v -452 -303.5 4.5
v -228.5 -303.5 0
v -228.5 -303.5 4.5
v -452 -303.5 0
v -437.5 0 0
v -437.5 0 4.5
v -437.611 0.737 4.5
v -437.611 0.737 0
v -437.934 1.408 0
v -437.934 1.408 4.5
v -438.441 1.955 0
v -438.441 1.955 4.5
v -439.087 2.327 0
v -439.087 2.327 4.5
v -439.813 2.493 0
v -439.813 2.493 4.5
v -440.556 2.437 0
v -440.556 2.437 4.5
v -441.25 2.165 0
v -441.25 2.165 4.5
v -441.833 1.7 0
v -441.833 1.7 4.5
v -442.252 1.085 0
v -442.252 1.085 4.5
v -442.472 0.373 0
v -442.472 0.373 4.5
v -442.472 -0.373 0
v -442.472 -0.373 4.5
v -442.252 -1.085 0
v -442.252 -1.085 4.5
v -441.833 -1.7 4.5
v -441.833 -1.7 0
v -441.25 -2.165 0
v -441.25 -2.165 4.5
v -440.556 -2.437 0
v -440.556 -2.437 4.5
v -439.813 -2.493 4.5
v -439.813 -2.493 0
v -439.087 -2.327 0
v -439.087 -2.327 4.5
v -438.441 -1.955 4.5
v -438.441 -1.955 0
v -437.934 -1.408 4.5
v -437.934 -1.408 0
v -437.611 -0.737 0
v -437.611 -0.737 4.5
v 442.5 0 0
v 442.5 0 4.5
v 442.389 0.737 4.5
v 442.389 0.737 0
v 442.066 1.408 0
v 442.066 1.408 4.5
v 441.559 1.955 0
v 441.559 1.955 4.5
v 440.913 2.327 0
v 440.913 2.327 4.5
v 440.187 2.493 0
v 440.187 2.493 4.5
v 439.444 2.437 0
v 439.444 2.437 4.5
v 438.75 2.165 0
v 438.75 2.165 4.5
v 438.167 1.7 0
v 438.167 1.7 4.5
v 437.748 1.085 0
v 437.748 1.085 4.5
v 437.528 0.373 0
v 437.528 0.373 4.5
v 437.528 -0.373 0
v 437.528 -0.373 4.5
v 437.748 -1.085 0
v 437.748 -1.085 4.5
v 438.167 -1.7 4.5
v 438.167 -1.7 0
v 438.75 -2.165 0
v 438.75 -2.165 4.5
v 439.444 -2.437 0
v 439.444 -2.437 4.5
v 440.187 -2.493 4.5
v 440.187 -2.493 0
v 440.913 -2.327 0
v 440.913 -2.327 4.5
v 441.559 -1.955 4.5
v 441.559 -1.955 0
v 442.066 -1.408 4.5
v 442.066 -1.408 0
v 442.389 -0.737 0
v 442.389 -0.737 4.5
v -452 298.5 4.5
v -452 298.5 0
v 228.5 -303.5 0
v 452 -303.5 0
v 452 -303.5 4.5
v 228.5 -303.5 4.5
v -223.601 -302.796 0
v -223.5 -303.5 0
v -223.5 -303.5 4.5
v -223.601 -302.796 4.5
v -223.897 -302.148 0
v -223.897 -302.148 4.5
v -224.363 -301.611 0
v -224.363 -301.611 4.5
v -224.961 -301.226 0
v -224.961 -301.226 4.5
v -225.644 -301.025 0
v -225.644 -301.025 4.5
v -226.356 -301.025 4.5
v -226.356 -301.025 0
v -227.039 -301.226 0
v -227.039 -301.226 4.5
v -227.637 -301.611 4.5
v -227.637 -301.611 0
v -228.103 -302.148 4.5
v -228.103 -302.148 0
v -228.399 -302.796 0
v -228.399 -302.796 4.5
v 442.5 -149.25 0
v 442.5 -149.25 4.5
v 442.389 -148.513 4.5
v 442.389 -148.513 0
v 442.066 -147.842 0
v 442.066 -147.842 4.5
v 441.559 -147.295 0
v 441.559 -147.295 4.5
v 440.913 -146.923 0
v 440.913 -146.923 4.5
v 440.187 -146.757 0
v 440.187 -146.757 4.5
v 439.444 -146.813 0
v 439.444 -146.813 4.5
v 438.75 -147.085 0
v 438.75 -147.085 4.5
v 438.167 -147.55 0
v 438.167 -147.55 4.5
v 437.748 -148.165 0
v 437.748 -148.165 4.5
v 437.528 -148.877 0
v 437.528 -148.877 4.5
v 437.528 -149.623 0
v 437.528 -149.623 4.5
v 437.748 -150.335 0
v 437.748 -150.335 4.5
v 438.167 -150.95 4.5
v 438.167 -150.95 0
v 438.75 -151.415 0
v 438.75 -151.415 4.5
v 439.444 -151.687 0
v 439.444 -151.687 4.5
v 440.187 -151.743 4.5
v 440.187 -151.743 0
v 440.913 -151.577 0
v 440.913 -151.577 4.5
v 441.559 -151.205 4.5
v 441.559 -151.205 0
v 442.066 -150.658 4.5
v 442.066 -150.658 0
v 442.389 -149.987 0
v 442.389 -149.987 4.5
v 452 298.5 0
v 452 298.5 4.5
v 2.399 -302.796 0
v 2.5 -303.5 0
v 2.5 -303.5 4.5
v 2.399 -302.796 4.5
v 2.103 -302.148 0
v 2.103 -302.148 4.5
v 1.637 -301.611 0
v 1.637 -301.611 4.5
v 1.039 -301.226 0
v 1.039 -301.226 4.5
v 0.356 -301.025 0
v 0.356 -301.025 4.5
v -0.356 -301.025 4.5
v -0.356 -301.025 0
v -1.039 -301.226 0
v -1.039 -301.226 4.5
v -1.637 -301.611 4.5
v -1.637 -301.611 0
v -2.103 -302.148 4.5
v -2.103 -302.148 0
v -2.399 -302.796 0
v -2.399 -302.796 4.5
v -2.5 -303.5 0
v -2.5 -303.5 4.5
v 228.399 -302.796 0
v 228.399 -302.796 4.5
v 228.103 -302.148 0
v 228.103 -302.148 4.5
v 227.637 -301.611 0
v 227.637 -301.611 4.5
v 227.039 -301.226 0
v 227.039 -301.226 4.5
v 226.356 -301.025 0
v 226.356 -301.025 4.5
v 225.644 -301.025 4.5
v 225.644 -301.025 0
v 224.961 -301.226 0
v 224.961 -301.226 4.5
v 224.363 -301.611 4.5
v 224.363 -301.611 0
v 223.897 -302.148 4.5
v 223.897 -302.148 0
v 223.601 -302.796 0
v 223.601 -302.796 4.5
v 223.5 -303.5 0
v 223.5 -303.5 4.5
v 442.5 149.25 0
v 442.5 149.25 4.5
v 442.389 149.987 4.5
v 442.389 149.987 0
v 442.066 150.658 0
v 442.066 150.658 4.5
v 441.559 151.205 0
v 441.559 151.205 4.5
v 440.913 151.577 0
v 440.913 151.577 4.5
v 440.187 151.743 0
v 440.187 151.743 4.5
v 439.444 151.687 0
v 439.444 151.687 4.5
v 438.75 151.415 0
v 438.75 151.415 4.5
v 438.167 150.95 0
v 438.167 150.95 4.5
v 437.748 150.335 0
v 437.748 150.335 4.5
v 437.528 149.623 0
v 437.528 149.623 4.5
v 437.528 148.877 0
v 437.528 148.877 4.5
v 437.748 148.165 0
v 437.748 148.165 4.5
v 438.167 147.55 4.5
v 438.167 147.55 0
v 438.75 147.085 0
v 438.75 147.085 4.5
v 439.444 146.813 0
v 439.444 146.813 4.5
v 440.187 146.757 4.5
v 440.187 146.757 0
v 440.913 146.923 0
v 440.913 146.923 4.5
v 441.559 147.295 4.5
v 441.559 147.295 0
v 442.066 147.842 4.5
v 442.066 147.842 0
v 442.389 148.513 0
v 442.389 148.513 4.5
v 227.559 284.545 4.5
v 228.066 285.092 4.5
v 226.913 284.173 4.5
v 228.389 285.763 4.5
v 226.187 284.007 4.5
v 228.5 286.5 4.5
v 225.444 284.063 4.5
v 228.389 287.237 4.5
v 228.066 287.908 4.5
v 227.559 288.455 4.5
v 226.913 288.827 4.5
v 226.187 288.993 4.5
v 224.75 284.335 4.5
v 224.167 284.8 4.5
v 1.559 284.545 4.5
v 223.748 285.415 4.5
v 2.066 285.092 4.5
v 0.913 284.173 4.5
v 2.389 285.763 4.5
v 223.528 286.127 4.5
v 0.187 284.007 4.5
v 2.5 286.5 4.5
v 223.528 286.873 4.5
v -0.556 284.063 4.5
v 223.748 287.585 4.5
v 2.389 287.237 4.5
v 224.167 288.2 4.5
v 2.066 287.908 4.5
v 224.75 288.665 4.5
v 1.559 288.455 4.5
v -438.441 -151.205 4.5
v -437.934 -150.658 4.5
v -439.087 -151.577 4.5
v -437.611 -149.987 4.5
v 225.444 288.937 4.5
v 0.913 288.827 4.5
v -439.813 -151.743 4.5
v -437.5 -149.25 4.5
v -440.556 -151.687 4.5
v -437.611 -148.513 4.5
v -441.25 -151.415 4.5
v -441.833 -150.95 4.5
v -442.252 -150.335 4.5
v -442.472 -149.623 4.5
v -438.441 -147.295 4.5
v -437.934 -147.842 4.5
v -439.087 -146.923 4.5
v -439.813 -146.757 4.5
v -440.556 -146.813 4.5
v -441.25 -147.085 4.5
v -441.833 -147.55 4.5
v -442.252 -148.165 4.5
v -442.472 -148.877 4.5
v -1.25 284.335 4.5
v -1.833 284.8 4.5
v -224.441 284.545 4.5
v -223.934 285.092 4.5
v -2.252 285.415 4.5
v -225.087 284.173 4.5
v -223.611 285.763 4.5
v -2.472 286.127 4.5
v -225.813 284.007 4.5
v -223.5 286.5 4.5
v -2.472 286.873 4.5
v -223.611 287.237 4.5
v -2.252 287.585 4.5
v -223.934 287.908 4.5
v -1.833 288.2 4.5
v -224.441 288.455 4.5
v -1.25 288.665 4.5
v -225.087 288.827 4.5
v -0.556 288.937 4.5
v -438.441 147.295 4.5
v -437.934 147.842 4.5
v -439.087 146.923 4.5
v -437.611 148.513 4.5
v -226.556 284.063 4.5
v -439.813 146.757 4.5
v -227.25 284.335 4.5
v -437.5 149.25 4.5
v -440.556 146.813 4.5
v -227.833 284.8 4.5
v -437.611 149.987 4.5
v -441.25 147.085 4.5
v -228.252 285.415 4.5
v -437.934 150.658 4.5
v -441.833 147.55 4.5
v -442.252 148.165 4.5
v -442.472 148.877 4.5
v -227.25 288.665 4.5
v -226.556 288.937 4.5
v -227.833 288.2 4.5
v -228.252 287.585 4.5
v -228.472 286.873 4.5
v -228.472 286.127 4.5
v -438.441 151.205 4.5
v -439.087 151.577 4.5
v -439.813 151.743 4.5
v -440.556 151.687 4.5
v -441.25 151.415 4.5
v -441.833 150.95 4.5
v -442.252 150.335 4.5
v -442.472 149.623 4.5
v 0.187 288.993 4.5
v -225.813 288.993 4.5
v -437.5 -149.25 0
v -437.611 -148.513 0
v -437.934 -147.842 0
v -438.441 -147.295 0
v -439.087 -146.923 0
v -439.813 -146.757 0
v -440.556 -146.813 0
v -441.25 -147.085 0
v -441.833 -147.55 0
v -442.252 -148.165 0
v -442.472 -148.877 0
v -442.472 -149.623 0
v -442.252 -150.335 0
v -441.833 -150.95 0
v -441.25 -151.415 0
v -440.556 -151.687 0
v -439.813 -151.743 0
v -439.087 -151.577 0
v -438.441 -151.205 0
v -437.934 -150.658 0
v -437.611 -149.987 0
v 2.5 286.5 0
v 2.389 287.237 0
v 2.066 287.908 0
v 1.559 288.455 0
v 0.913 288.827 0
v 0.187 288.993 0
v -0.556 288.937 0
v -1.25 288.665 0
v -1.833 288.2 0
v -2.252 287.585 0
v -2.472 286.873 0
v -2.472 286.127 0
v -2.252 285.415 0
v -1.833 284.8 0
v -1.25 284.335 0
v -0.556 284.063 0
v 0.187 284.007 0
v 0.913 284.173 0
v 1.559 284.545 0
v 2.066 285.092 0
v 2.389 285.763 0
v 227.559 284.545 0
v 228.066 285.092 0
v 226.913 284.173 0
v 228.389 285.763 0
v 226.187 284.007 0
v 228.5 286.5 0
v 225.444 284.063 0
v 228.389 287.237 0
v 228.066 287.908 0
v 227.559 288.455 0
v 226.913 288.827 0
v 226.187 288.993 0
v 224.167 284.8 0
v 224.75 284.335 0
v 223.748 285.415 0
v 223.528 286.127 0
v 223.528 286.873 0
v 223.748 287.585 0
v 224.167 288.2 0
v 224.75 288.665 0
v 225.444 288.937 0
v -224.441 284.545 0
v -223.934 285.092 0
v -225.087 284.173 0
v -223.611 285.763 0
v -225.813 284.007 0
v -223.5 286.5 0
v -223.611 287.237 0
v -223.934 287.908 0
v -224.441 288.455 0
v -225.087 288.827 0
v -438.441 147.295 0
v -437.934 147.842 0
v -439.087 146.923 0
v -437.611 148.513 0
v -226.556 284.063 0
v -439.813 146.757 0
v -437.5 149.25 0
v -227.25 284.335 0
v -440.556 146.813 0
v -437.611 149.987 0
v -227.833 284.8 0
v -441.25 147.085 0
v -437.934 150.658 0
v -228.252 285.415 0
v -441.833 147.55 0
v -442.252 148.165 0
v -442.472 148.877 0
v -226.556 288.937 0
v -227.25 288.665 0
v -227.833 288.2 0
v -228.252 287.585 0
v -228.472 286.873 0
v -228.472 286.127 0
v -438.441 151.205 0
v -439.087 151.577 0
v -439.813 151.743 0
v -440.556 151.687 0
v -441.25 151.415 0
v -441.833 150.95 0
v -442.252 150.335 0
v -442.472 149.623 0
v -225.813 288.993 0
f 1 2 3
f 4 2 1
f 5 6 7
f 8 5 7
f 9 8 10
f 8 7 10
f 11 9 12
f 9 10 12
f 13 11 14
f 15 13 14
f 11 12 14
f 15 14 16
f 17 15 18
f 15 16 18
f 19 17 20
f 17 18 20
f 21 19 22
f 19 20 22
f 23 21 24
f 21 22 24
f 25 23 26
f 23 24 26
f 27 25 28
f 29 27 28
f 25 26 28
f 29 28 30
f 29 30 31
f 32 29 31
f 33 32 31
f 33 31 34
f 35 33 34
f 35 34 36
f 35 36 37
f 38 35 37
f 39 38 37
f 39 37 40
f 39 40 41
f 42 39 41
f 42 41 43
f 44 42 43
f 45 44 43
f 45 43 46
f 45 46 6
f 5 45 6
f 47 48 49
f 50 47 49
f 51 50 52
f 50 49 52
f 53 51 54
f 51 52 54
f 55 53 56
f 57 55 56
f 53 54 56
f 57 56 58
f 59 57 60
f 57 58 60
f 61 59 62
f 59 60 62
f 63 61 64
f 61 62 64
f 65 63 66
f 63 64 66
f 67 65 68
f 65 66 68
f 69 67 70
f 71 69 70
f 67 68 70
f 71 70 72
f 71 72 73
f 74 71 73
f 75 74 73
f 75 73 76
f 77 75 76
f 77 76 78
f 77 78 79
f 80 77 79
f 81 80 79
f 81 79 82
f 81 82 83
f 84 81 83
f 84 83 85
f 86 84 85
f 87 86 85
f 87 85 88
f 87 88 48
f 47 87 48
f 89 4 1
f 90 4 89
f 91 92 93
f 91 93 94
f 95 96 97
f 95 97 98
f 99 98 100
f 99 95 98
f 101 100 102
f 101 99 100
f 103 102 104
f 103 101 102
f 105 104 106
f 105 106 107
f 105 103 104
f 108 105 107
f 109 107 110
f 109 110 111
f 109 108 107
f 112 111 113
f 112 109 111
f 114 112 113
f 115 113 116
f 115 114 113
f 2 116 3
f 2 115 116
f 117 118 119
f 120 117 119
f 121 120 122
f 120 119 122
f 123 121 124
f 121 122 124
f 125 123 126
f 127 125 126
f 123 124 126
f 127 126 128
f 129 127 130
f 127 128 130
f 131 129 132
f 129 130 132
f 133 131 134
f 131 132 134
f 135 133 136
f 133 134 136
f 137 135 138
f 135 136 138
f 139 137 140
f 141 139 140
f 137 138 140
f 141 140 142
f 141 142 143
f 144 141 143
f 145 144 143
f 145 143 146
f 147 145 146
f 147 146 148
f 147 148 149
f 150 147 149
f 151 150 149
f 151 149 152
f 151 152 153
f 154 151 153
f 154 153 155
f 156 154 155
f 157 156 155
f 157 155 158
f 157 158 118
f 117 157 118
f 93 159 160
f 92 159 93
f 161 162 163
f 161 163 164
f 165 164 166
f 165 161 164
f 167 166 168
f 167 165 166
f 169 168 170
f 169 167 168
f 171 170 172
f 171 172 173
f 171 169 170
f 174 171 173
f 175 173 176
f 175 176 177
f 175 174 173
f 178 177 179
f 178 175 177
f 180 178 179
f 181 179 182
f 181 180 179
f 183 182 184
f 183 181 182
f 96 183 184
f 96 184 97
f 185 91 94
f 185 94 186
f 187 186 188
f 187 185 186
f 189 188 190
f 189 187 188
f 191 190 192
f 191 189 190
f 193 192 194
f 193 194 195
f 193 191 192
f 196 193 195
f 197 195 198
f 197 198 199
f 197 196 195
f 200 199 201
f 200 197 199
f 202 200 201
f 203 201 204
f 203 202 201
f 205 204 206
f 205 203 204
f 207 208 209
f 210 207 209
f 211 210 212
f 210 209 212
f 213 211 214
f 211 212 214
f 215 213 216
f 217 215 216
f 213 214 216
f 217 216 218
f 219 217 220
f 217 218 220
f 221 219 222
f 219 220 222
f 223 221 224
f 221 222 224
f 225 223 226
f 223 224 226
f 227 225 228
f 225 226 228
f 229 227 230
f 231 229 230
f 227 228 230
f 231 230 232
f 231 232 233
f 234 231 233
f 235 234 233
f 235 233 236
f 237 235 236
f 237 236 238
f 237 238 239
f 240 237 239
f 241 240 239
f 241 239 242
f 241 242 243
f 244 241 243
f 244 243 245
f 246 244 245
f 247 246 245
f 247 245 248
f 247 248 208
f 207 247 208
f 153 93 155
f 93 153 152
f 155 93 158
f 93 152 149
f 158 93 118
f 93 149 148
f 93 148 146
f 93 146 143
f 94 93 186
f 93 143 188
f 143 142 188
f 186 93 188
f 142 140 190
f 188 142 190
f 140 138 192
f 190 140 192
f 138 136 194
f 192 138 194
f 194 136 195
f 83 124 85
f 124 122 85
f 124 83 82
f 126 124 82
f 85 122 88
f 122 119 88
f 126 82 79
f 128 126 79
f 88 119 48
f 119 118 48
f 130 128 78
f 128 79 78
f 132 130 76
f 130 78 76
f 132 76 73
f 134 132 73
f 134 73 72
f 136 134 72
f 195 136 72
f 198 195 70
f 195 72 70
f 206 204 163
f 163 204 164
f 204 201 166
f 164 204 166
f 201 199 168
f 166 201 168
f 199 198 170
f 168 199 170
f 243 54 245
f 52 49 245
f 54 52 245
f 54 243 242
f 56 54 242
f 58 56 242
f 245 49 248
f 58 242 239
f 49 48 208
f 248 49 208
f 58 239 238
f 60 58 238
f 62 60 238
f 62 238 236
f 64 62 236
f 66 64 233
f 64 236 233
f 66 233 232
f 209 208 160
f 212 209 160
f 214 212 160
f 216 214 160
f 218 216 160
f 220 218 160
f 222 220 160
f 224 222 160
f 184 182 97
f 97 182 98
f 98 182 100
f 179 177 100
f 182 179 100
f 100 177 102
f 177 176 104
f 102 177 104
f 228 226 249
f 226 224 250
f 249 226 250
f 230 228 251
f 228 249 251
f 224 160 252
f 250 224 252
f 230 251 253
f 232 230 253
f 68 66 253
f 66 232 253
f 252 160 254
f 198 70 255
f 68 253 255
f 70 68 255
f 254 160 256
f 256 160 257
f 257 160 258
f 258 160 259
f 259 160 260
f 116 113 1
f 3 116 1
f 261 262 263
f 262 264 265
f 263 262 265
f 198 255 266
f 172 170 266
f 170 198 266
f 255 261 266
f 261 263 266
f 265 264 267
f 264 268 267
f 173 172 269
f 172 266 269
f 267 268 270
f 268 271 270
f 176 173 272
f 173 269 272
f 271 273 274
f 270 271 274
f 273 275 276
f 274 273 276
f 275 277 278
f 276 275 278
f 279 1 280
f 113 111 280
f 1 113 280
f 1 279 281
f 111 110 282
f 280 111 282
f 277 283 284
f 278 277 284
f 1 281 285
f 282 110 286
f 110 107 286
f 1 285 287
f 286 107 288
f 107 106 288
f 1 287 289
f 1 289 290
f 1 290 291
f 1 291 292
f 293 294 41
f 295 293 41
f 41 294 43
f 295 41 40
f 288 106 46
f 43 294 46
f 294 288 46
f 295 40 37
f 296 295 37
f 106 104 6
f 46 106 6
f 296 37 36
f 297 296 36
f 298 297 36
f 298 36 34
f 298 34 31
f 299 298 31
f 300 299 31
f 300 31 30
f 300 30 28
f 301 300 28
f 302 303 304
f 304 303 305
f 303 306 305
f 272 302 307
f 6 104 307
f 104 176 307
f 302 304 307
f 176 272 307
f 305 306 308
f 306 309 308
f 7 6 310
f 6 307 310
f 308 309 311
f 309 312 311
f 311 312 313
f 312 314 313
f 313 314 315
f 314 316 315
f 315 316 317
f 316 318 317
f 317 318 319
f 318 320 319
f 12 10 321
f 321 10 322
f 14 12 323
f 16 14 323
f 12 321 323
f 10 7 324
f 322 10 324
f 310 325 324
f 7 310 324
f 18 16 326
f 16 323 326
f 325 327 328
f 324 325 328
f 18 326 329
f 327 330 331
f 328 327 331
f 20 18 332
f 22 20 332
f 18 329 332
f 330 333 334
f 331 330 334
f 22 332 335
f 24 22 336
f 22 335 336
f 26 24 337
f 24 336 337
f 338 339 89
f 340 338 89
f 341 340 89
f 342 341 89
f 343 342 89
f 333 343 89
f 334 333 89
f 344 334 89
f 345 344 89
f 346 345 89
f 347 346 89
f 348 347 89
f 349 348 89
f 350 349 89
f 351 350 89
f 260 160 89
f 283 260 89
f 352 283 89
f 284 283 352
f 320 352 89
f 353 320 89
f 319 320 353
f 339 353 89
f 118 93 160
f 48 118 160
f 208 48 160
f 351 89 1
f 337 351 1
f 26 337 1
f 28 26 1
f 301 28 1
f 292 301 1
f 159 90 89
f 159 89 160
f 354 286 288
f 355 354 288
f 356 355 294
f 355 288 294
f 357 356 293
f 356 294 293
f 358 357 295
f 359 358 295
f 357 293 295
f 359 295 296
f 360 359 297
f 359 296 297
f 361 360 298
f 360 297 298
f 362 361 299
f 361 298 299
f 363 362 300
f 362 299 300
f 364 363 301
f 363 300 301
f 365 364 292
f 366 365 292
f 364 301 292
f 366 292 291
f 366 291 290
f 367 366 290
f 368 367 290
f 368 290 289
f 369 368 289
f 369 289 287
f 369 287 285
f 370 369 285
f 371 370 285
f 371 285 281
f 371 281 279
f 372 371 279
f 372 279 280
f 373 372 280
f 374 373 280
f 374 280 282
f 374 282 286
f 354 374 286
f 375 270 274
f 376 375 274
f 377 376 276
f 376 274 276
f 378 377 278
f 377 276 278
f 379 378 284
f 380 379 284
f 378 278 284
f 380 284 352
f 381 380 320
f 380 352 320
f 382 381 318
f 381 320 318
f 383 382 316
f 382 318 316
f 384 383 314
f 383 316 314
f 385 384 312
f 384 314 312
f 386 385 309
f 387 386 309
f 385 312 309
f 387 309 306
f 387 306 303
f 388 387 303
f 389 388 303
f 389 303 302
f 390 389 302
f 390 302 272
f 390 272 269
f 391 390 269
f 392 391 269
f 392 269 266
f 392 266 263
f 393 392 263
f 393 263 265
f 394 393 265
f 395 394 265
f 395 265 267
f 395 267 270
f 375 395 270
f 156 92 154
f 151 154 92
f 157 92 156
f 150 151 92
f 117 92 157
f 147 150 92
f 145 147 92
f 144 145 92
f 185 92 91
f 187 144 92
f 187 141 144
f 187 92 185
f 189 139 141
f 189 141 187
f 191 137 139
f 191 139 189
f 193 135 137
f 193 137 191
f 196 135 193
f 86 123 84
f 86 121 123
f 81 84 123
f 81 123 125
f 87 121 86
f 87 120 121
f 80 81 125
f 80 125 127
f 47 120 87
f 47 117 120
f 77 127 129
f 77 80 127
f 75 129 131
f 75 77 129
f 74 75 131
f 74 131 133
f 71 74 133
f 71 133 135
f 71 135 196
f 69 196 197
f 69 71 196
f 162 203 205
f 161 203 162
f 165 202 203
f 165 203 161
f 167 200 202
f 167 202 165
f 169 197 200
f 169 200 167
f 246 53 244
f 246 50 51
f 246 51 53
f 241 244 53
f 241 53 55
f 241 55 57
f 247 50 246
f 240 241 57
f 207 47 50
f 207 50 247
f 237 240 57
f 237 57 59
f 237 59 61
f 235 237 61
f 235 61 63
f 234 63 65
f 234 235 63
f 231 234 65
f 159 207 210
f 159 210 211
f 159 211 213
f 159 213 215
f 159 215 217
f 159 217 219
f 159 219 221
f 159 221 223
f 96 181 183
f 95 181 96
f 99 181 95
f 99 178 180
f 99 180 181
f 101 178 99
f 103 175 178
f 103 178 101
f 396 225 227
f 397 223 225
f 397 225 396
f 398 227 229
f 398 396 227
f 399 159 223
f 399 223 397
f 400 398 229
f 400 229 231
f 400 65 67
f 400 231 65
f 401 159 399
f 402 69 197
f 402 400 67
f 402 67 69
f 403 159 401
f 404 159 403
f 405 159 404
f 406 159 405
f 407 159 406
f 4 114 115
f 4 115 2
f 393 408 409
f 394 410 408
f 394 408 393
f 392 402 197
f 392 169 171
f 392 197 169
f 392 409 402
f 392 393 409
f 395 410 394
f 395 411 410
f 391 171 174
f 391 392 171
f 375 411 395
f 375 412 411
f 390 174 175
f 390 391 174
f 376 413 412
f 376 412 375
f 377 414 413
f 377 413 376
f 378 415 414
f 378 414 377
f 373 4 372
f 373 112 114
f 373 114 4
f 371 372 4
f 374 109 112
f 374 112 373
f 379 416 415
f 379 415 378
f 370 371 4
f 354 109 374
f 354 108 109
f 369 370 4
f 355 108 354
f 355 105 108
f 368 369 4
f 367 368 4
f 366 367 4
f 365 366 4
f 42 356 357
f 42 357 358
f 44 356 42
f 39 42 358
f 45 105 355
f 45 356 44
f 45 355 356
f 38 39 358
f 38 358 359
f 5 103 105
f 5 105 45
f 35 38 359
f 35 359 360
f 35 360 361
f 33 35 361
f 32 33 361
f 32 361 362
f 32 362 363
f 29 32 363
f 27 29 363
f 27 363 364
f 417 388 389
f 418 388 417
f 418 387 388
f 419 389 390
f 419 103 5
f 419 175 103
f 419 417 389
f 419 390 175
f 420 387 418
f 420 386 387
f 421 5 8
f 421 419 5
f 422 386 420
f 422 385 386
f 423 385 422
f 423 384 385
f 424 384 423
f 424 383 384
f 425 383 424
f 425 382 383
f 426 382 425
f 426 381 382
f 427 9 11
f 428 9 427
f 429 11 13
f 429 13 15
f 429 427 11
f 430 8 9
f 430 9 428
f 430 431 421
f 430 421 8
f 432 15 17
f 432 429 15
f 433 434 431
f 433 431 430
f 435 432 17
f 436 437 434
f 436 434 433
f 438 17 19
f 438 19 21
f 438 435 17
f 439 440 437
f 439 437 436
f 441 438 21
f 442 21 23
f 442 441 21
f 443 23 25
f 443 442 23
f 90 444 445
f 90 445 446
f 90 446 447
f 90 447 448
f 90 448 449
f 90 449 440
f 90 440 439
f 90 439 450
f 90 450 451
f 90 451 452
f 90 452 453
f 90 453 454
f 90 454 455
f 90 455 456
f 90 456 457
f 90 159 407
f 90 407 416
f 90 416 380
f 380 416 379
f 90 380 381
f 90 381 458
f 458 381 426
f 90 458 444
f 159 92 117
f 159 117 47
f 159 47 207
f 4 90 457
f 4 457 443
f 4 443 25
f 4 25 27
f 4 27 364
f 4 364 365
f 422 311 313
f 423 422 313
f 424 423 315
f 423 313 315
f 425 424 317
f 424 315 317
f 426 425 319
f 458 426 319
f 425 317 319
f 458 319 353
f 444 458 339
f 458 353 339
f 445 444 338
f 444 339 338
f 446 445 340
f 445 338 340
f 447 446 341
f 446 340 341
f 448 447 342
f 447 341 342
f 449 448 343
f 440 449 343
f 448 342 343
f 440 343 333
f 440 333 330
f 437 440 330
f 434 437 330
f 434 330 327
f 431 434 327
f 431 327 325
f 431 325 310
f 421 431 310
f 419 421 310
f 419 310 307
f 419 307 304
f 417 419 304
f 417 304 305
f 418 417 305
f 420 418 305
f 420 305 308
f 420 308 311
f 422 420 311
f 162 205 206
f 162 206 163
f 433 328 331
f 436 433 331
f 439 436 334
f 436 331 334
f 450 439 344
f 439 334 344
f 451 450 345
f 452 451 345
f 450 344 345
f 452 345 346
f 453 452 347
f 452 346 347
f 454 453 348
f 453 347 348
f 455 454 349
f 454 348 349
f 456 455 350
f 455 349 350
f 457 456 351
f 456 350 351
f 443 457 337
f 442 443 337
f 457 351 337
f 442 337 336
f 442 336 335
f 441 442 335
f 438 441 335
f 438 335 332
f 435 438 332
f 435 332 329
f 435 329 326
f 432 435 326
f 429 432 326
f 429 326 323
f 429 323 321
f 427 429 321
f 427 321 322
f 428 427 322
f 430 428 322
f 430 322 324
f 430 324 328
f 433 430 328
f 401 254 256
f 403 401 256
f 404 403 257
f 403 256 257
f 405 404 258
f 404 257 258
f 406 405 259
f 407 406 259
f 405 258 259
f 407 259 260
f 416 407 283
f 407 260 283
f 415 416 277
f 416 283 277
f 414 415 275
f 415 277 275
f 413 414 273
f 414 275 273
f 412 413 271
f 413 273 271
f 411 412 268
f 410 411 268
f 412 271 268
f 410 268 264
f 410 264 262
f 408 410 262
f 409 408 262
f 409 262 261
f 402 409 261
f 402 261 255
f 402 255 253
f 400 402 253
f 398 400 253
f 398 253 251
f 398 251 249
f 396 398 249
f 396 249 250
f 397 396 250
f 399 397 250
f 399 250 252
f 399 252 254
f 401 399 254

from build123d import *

# Parameters (mm, degrees)
BOSS_EXTRUDE1_DEPTH = 4.5
SKETCH2_R           = 2.5
CUT_EXTRUDE1_DEPTH  = 10


with BuildPart() as part:
    # Sketch1 → Boss-Extrude1 (new body)
    with BuildSketch(Plane.XY):
        with BuildLine():
            Line((-452, 298.5), (452, 298.5))
            Line((452, 298.5), (452, -303.5))
            Line((452, -303.5), (228.5, -303.5))
            ThreePointArc((228.5, -303.5), (226, -301), (223.5, -303.5))
            Line((223.5, -303.5), (2.5, -303.5))
            ThreePointArc((2.5, -303.5), (0, -301), (-2.5, -303.5))
            Line((-2.5, -303.5), (-223.5, -303.5))
            ThreePointArc((-223.5, -303.5), (-226, -301), (-228.5, -303.5))
            Line((-228.5, -303.5), (-452, -303.5))
            Line((-452, -303.5), (-452, 298.5))
        make_face()
    extrude(amount=BOSS_EXTRUDE1_DEPTH)

    # Sketch2 → Cut-Extrude1 (cut)
    with BuildSketch(Plane.XY.offset(4.5)):
        with Locations((0, 286.5)):
            Circle(SKETCH2_R)
        with Locations((440, -149.25)):
            Circle(SKETCH2_R)
        with Locations((440, 0)):
            Circle(SKETCH2_R)
        with Locations((440, 149.25)):
            Circle(SKETCH2_R)
        with Locations((-440, -149.25)):
            Circle(SKETCH2_R)
        with Locations((-440, 0)):
            Circle(SKETCH2_R)
        with Locations((-440, 149.25)):
            Circle(SKETCH2_R)
        with Locations((226, 286.5)):
            Circle(SKETCH2_R)
        with Locations((-226, 286.5)):
            Circle(SKETCH2_R)
    extrude(amount=-CUT_EXTRUDE1_DEPTH, mode=Mode.SUBTRACT)


solid = part.part
